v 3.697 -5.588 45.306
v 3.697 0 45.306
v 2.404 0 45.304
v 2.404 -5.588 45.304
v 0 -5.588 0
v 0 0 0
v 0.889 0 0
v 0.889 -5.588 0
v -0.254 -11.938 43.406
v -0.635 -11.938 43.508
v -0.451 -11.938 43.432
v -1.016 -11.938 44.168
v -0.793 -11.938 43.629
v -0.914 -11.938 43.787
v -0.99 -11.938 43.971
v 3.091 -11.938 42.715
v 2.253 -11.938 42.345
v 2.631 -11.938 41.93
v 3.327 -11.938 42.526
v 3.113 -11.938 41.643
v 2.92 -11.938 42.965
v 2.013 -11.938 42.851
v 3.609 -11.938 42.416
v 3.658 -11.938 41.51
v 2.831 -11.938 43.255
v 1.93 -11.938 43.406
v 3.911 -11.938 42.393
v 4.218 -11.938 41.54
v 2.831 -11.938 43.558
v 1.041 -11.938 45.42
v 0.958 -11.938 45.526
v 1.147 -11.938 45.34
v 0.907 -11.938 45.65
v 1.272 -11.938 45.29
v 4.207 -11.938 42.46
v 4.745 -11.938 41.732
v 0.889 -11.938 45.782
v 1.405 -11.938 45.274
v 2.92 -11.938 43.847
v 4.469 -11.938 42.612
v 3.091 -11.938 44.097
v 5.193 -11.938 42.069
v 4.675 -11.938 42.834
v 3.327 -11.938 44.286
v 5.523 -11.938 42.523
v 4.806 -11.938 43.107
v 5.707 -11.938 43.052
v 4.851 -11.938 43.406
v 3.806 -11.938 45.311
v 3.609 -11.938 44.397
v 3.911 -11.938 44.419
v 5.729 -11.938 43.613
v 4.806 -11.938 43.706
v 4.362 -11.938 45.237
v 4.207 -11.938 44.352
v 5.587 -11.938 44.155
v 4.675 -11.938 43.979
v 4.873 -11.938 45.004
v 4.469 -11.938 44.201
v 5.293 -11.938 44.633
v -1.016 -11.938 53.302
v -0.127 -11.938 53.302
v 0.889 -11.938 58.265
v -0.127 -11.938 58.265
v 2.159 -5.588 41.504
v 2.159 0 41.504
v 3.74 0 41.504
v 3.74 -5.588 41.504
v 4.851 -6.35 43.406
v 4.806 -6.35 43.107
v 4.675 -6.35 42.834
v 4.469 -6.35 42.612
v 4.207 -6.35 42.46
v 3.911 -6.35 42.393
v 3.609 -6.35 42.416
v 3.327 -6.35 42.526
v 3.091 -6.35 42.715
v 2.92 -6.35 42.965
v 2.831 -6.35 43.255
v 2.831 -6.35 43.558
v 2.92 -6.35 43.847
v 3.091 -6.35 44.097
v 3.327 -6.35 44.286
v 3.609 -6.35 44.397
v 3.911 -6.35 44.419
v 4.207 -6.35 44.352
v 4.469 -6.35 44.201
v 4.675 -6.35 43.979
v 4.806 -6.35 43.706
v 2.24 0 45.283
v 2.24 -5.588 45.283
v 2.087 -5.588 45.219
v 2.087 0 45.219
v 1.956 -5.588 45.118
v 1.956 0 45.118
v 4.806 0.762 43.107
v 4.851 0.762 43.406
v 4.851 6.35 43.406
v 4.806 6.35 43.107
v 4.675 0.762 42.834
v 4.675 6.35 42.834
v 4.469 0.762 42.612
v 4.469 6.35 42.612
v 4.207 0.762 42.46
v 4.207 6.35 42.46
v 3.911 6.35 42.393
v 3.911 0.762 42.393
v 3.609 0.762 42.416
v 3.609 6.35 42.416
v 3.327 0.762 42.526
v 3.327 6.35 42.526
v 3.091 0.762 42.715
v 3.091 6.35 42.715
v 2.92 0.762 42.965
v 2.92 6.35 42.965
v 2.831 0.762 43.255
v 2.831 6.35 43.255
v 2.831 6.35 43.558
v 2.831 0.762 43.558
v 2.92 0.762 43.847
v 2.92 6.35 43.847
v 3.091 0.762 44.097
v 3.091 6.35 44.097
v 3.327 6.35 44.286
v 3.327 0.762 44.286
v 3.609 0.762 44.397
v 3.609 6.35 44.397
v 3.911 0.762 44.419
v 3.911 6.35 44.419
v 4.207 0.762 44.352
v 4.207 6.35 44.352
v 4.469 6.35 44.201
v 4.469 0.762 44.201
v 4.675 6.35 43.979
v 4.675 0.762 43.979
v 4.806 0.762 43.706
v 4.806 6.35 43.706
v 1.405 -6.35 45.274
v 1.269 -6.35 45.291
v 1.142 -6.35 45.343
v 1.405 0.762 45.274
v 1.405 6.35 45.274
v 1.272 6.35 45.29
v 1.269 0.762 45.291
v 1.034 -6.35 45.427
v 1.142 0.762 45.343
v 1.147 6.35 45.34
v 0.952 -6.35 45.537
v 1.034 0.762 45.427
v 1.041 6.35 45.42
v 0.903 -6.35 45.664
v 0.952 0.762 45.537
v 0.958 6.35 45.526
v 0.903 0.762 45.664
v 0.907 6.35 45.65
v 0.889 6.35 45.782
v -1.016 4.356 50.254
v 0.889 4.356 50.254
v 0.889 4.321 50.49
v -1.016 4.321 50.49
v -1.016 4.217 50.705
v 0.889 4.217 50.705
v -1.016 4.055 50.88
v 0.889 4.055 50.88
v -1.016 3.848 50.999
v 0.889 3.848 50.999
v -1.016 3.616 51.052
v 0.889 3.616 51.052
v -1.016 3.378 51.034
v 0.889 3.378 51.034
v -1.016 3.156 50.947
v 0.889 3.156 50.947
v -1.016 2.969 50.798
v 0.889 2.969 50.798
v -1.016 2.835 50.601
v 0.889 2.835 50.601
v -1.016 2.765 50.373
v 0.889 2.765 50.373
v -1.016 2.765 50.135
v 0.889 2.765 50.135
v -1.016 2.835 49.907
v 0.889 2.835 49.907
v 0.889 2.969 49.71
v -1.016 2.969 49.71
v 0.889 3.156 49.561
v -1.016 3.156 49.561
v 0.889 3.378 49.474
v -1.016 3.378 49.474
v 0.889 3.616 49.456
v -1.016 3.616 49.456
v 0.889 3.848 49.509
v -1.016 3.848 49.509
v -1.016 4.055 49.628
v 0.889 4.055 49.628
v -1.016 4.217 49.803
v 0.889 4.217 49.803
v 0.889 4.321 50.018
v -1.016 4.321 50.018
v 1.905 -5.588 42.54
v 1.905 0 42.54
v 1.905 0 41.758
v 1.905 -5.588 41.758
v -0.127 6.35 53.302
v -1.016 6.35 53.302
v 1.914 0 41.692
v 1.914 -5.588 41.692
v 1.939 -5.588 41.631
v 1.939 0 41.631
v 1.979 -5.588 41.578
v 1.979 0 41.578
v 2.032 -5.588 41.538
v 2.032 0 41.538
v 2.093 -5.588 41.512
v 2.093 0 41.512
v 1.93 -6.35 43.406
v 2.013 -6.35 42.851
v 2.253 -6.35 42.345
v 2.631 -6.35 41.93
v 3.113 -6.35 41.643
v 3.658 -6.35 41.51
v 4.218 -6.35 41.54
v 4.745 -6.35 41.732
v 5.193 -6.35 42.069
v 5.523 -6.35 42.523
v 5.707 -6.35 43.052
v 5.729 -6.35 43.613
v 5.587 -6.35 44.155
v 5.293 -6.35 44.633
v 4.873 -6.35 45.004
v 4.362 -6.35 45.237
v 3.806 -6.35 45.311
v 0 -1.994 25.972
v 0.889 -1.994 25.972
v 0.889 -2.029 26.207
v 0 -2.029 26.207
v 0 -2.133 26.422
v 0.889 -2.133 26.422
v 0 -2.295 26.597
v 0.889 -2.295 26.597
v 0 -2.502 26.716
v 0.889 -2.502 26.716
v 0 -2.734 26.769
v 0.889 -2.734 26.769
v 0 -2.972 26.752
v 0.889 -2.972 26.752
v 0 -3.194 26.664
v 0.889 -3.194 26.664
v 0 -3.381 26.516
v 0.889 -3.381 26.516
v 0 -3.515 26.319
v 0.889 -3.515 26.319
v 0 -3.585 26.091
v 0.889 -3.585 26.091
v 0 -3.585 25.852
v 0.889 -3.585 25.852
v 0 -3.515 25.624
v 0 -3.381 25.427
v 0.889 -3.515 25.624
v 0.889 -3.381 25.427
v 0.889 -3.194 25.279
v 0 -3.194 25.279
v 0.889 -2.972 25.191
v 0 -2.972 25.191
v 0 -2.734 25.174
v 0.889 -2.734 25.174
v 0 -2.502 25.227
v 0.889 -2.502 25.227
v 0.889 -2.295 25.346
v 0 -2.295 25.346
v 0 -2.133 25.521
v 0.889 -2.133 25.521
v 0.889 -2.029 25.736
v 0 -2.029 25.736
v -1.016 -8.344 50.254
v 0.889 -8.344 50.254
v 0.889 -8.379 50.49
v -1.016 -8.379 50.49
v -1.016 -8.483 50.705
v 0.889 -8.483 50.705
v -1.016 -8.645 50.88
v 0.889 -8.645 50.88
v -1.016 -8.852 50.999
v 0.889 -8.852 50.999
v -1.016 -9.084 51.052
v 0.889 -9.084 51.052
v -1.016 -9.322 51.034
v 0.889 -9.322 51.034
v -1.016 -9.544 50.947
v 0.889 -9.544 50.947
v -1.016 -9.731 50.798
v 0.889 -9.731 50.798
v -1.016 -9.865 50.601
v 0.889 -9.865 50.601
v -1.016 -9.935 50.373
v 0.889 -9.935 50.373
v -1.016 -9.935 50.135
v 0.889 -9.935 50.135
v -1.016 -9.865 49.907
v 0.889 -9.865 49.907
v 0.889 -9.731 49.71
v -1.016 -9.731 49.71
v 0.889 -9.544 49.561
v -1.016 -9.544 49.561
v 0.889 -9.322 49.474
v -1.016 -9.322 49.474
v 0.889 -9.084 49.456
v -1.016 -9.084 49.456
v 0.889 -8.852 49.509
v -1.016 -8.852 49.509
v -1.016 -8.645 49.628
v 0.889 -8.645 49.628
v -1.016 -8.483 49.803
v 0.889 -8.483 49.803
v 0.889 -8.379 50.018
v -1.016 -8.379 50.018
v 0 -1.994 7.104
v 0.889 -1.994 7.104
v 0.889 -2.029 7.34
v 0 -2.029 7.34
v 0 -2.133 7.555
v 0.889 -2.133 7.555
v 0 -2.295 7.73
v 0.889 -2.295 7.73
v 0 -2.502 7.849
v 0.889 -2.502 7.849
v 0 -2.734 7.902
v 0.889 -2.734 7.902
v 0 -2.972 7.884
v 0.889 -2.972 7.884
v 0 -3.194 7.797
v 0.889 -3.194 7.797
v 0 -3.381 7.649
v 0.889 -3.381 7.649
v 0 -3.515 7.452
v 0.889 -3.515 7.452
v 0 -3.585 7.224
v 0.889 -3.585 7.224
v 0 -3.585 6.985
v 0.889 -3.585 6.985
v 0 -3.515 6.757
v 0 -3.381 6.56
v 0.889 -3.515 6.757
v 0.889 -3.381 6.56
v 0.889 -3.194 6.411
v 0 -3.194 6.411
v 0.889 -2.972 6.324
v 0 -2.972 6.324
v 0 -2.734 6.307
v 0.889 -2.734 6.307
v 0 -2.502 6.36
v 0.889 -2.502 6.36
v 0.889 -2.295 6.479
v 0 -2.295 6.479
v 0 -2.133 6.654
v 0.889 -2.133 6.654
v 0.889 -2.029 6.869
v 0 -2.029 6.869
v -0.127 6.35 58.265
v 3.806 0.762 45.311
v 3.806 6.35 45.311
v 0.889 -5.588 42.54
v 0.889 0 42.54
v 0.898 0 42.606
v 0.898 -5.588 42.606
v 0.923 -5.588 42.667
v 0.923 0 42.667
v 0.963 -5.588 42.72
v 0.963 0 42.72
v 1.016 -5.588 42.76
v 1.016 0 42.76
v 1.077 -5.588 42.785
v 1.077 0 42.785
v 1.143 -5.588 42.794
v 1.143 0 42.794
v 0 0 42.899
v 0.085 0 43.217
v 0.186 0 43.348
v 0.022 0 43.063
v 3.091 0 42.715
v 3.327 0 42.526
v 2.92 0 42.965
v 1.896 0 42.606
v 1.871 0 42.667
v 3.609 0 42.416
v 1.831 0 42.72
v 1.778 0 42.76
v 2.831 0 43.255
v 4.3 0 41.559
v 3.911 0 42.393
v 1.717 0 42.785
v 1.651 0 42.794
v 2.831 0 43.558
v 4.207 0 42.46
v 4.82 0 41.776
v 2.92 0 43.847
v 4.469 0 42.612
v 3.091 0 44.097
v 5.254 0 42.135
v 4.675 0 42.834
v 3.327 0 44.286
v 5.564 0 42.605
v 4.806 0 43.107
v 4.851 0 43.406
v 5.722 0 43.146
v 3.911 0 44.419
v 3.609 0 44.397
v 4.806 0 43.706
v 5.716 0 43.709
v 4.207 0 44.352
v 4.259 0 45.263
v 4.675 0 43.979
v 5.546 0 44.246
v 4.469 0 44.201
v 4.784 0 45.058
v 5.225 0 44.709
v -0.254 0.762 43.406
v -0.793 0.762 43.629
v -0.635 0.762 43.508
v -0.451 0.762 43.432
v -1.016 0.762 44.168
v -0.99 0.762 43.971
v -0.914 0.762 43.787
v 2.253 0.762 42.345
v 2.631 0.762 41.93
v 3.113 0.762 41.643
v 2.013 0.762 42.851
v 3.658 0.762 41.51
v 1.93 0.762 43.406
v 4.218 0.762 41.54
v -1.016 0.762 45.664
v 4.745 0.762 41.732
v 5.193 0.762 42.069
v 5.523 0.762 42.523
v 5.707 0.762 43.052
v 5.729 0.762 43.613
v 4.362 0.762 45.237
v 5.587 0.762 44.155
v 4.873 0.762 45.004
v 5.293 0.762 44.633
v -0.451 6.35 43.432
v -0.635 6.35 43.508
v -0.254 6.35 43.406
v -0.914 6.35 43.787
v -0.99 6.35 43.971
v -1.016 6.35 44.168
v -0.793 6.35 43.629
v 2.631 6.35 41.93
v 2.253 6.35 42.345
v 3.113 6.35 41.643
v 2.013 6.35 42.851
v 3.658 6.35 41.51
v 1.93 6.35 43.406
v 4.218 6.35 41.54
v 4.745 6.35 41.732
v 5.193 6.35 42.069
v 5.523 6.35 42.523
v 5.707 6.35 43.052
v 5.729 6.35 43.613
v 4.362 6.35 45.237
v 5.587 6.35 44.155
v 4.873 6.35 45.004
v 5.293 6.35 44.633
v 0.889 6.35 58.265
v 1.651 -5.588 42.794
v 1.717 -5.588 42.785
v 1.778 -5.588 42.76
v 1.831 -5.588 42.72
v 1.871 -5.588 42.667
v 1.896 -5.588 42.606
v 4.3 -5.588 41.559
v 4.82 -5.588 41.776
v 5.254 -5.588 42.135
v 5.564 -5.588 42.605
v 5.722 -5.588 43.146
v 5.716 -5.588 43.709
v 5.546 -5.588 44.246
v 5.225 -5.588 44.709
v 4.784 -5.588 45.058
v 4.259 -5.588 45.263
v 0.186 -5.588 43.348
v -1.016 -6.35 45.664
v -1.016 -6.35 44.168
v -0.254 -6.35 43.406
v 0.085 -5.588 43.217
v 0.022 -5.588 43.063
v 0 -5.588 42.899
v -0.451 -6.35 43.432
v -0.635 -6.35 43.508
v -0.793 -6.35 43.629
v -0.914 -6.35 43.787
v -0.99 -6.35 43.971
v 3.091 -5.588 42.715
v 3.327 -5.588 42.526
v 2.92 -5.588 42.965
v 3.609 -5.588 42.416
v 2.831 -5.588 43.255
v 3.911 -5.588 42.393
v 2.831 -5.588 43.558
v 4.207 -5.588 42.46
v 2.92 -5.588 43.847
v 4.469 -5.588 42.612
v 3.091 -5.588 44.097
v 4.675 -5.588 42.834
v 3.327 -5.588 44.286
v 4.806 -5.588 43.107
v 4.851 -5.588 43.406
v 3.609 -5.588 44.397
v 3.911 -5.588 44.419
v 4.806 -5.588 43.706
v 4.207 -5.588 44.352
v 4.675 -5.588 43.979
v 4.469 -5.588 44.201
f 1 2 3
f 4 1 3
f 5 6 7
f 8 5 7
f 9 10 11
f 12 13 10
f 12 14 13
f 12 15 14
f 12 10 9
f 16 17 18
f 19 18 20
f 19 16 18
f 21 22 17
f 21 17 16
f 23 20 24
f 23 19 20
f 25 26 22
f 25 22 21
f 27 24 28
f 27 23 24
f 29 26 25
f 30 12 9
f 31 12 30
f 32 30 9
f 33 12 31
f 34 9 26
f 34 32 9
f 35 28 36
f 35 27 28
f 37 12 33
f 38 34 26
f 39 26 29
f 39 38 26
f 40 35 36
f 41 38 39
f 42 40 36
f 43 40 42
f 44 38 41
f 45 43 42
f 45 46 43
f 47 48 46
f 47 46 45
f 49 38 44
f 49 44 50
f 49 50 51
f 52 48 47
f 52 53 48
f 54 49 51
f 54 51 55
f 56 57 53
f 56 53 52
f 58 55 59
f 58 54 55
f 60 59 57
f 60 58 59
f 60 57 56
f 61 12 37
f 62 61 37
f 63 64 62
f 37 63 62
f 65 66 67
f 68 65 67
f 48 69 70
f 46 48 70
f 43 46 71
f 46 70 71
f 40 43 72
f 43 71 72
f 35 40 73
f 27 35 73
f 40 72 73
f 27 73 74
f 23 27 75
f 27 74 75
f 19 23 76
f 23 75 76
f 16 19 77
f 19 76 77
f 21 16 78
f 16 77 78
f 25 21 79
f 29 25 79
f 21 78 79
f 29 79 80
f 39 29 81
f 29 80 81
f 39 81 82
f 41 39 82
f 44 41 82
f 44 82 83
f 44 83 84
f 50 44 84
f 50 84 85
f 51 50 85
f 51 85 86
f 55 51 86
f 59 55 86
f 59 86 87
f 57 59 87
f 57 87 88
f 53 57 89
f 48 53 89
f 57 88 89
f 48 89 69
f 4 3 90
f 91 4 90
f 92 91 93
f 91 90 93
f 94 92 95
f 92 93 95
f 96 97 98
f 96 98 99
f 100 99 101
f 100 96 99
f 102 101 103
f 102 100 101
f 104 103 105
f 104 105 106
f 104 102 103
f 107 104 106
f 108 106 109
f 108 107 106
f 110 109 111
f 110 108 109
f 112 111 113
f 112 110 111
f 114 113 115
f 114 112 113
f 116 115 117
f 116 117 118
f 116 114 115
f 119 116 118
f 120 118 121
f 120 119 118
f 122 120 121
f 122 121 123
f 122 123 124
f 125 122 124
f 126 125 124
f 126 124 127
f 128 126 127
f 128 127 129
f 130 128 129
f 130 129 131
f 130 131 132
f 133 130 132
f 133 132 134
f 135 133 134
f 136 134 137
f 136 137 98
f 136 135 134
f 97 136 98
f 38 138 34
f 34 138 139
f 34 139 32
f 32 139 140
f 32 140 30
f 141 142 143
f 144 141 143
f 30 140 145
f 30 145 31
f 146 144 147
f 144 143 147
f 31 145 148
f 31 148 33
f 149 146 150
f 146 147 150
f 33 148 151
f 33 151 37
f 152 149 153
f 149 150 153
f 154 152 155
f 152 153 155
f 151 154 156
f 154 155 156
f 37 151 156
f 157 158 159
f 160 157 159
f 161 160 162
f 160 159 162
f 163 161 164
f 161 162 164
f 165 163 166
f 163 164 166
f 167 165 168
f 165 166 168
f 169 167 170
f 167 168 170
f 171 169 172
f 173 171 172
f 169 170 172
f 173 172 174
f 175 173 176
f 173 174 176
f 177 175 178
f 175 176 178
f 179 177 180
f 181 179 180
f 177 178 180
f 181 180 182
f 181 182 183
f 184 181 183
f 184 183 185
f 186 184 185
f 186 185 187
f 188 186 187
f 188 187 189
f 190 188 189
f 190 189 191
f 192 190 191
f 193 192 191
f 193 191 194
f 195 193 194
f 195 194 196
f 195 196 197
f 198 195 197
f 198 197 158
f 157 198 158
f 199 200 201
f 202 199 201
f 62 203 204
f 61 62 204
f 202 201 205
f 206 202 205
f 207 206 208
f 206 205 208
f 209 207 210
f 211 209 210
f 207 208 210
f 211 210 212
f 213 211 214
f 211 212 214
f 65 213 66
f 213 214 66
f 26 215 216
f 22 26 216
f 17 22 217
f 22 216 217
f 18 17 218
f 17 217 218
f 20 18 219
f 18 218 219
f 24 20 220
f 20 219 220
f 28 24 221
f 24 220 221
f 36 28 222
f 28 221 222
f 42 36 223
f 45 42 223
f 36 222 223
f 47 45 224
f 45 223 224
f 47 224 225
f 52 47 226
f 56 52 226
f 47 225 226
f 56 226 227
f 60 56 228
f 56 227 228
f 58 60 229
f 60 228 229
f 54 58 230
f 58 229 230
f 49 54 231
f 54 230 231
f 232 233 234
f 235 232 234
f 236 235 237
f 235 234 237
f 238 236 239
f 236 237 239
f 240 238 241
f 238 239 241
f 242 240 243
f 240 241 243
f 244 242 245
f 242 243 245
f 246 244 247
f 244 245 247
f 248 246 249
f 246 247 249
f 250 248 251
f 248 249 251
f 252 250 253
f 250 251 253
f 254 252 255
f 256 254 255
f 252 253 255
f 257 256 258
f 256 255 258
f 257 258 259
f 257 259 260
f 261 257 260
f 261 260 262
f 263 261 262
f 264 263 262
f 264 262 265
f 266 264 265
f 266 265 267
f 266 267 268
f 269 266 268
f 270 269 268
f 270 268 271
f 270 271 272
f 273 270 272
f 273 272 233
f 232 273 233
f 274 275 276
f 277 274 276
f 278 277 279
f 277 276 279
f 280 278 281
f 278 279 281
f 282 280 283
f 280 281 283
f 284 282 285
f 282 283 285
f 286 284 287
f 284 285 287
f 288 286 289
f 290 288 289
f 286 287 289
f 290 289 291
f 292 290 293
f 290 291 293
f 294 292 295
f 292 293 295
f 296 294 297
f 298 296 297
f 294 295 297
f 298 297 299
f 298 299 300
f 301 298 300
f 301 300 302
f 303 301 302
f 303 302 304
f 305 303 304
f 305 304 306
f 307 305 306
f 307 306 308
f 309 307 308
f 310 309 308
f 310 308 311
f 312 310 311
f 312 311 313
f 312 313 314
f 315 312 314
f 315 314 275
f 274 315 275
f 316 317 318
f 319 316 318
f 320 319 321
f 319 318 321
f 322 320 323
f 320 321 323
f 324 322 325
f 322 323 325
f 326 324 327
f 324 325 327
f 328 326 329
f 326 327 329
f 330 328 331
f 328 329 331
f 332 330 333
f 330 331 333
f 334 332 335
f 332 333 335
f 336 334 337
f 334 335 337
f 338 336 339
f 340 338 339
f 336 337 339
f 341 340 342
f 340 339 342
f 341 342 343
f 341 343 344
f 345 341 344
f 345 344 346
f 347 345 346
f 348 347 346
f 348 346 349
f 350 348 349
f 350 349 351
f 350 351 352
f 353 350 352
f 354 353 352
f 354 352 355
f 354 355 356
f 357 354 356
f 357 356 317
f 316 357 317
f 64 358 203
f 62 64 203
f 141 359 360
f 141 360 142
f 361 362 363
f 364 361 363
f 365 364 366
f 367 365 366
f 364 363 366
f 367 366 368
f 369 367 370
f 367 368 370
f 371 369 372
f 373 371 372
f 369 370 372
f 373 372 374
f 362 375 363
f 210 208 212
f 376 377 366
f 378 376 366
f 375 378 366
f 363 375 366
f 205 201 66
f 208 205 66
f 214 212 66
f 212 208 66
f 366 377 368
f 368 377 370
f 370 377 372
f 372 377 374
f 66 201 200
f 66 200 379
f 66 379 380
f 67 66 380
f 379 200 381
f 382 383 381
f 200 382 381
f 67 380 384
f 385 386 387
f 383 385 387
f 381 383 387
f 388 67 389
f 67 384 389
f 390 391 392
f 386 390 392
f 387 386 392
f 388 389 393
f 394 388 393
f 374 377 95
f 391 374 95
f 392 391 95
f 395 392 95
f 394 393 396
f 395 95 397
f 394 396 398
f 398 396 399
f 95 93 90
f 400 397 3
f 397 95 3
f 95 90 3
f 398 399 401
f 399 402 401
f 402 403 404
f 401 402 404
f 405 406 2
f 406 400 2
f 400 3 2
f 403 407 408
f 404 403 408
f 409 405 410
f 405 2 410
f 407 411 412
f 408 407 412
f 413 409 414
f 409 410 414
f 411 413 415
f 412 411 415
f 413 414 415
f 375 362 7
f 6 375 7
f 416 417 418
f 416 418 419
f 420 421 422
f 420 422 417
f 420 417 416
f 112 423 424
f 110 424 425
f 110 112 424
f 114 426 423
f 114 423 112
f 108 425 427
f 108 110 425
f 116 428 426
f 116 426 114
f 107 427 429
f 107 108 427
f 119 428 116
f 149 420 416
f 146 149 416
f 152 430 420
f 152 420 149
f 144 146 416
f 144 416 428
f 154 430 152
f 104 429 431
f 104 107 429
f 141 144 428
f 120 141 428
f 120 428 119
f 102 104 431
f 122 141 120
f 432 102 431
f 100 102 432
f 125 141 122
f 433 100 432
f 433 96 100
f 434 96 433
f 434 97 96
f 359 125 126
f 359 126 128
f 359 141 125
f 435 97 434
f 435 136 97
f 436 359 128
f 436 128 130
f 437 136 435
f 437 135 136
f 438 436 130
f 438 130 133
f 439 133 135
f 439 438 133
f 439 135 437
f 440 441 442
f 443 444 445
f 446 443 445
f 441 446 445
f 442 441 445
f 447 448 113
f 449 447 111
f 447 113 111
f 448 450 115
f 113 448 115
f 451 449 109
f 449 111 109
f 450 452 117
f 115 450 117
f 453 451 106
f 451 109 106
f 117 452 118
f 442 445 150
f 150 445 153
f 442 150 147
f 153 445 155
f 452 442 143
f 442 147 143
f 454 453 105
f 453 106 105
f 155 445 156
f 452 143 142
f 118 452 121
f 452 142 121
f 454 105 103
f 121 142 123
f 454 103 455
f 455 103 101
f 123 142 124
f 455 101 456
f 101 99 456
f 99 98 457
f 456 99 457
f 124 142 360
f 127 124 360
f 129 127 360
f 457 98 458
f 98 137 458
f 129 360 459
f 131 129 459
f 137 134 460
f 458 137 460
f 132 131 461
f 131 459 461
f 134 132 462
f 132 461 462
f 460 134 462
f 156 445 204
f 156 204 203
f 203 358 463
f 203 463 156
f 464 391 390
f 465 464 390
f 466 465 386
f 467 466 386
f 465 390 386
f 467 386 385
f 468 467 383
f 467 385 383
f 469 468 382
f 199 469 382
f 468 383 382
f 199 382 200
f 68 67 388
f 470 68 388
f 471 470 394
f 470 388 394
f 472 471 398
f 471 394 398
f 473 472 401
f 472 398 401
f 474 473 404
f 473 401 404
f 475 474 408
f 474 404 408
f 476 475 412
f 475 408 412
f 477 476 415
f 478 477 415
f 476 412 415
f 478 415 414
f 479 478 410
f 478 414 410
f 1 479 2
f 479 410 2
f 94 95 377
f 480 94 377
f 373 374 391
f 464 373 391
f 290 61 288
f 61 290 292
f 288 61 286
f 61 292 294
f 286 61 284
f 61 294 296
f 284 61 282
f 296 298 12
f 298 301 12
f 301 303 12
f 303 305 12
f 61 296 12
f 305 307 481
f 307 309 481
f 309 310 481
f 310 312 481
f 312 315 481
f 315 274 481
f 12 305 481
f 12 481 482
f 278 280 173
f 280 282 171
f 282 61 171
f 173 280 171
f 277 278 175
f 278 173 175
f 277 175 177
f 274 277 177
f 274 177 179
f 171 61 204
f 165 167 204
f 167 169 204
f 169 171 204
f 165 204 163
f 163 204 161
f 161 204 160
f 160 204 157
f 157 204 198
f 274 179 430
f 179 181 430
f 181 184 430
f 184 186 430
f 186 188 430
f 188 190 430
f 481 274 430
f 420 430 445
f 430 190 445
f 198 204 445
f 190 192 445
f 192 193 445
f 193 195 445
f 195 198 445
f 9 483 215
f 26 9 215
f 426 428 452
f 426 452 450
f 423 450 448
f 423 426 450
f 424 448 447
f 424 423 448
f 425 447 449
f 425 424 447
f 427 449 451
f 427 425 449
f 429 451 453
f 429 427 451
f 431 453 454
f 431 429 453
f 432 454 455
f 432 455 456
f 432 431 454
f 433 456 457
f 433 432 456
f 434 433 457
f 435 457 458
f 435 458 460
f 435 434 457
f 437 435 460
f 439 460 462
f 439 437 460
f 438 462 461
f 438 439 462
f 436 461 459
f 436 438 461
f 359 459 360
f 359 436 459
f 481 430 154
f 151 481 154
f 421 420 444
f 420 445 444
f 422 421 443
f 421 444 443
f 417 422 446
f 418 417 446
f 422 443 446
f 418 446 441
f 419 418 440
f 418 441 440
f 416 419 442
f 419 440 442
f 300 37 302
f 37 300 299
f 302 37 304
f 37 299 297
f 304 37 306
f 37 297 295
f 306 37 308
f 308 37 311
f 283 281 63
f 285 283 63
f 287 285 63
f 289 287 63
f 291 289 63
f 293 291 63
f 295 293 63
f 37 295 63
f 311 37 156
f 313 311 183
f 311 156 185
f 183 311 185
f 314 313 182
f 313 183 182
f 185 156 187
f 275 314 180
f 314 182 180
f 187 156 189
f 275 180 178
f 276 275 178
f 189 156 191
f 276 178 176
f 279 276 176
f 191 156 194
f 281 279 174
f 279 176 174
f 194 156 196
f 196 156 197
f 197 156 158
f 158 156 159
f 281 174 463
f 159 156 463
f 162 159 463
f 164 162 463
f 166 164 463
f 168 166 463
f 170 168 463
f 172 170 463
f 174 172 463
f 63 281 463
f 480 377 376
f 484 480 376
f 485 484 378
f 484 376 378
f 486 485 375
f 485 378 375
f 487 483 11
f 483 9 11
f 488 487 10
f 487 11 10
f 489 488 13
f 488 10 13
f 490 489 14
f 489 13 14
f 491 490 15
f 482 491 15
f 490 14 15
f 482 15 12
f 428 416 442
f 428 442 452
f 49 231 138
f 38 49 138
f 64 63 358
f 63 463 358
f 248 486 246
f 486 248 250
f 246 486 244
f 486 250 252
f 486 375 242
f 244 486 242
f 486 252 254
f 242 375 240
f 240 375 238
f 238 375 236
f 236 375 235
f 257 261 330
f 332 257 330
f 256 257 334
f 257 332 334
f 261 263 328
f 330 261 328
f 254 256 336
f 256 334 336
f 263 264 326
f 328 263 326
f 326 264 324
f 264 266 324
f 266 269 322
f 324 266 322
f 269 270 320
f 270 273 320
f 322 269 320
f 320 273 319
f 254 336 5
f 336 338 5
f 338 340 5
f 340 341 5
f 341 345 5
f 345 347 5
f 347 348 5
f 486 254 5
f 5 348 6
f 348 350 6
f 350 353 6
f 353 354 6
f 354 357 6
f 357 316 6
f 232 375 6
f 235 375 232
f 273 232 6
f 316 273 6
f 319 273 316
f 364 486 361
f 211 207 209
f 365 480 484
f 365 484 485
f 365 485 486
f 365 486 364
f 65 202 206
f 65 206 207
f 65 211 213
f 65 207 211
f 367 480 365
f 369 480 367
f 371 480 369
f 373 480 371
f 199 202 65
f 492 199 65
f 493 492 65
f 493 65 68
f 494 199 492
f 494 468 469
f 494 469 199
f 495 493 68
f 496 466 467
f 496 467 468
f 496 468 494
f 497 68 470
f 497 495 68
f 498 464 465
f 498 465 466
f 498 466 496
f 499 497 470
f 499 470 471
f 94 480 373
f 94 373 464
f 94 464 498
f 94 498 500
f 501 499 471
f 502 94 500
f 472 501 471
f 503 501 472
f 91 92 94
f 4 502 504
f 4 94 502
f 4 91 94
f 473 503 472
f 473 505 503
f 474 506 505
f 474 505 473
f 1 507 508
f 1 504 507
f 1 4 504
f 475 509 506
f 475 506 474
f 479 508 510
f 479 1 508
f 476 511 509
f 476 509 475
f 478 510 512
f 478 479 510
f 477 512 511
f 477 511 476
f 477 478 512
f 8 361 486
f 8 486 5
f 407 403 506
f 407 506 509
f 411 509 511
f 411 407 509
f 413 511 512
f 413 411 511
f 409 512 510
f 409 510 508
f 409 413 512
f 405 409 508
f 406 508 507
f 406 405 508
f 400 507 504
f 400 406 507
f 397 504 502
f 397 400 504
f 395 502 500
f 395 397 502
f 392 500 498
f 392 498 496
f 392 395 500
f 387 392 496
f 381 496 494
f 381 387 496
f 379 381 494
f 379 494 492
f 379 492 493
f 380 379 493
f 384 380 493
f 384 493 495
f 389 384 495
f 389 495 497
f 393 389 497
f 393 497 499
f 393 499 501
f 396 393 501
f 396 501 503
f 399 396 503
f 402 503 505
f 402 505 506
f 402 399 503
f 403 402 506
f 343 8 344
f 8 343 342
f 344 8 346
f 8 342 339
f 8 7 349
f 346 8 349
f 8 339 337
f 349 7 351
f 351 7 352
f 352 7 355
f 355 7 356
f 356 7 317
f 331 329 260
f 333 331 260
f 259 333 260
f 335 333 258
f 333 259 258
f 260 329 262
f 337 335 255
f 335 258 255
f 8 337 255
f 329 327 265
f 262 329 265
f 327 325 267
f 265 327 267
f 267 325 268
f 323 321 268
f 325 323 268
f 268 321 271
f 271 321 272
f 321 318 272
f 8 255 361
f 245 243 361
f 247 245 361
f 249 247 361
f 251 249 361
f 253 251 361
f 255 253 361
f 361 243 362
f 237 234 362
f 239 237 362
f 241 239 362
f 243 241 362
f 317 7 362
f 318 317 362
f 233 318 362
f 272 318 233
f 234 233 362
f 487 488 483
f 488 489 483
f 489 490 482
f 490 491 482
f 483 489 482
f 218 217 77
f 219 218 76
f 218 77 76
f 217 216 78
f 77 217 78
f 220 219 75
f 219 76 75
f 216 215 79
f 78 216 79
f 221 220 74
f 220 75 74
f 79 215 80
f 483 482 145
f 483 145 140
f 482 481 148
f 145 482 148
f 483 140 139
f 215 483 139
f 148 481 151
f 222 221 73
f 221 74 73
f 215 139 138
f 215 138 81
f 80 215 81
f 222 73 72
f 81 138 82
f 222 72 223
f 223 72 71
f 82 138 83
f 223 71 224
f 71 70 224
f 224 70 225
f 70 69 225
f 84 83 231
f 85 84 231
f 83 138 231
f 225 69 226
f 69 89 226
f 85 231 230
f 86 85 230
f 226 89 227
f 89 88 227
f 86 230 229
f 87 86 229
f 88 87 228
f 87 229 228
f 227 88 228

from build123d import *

# Parameters (mm, degrees)
F0_R           = 1.016
F1_DEPTH       = 5.588
F2_R           = 0.8001
F3_DEPTH       = 25.4
F3_DEPTH_BACK  = 25.4
F6_DEPTH       = 5.588
F10_DEPTH      = 7.112
F12_R          = 0.508
F13_R          = 0.762
F14_R          = 0.8001
F15_DEPTH      = 25.4
F15_DEPTH_BACK = 25.4
F16_DEPTH      = 25.4
F16_DEPTH_BACK = 25.4


with BuildPart() as f1:
    # F0 (on Front) → F1 (new body)
    with BuildSketch(Plane.XZ):
        with BuildLine():
            Line((0, 42.8991302448), (0, 0))
            Line((0, 0), (0.889, 0))
            Line((0.889, 0), (0.889, 42.53992))
            ThreePointArc((0.889, 42.53992), (0.9633948776, 42.7195251224), (1.143, 42.79392))
            Line((1.143, 42.79392), (1.651, 42.79392))
            ThreePointArc((1.651, 42.79392), (1.8306051224, 42.7195251224), (1.905, 42.53992))
            Line((1.905, 42.53992), (1.905, 41.7576))
            ThreePointArc((1.905, 41.7576), (1.9793948776, 41.5779948776), (2.159, 41.5036))
            Line((2.159, 41.5036), (3.7398205742, 41.5036))
            ThreePointArc((3.7398205742, 41.5036), (5.7402818064, 43.4274211016), (3.6974596514, 45.306200071))
            Line((3.6974596514, 45.306200071), (2.4042806048, 45.3043289671))
            ThreePointArc((2.4042806048, 45.3043289671), (2.1617710488, 45.25581718), (1.9561865808, 45.1183424378))
            Line((1.9561865808, 45.1183424378), (0.1859871939, 43.3481430509))
            ThreePointArc((0.1859871939, 43.3481430509), (0.0483364969, 43.1421342244), (0, 42.8991302448))
        make_face()
        with Locations((3.8354, 43.4062007393)):
            Circle(F0_R, mode=Mode.SUBTRACT)
    extrude(amount=F1_DEPTH)

    # F2 (on face) → F3 (cut, two sides)
    with BuildSketch(Plane.YZ.offset(0.889)) as f3_sk:
        with Locations((-2.794, 25.9715)):
            Circle(F2_R)
        with Locations((-2.794, 7.10438)):
            Circle(F2_R)
    extrude(amount=-F3_DEPTH, mode=Mode.SUBTRACT)
    extrude(f3_sk.sketch, amount=F3_DEPTH_BACK, mode=Mode.SUBTRACT)


with BuildPart() as f6:
    # F5 (on offset) → F6 (new body)
    with BuildSketch(Plane.XZ.offset(-0.762)):
        with BuildLine():
            Line((-1.016, 43.4062007393), (1.9304, 43.4062007393))
            ThreePointArc((1.9304, 43.4062007393), (5.1926627539, 42.0694648578), (3.8063714614, 45.3109795569))
            Line((3.8063714614, 45.3109795569), (0.889, 45.2665192609))
            Line((0.889, 45.2665192609), (0.889, 58.2652007393))
            Line((0.889, 58.2652007393), (-0.127, 58.2652007393))
            Line((-0.127, 58.2652007393), (-0.127, 53.3020407393))
            Line((-0.127, 53.3020407393), (-1.016, 53.3020407393))
            Line((-1.016, 53.3020407393), (-1.016, 43.4062007393))
        make_face()
        with BuildLine():
            ThreePointArc((2.8194, 43.4062007393), (3.8354, 44.4222007393), (4.8514, 43.4062007393))
            ThreePointArc((4.8514, 43.4062007393), (3.8354, 42.3902007393), (2.8194, 43.4062007393))
        make_face(mode=Mode.SUBTRACT)
    extrude(amount=-F6_DEPTH)


with BuildPart() as f8_1:
    # F8: instance of F6
    add(f6.part.mirror(Plane.XZ.offset(2.794)))


with BuildPart() as f10:
    # F9 (on face) → F10 (new body, through all)
    with BuildSketch(Plane.XZ.offset(-0.762)):
        Polygon((-1.016, 53.3020407393), (-1.016, 45.6642607393), (0.889, 45.6642607393), (0.889, 58.2652007393), (-0.127, 58.2652007393), (-0.127, 53.3020407393), align=None)
    extrude(amount=F10_DEPTH)


with BuildPart() as f6_1:
    add(f6.part)

    # F11: union F10, F8_1
    add(f10.part)
    add(f8_1.part)

    # F12
    f12_edges = [f6_1.edges().sort_by_distance(p)[0] for p in [
        (0.889, 3.556, 45.266519),
    ]]
    fillet(f12_edges, radius=F12_R)

    # F13
    f13_edges = [f6_1.edges().sort_by_distance(p)[0] for p in [
        (-1.016, -9.144, 43.406201),
        (-1.016, 3.556, 43.406201),
    ]]
    fillet(f13_edges, radius=F13_R)

    # F14 (on face) → F15 (cut, two sides)
    with BuildSketch(Plane.YZ.offset(0.889)) as f15_sk:
        with Locations((-9.144, 50.2540407393)):
            Circle(F14_R)
    extrude(amount=-F15_DEPTH, mode=Mode.SUBTRACT)
    extrude(f15_sk.sketch, amount=F15_DEPTH_BACK, mode=Mode.SUBTRACT)

    # F14 (on face) → F16 (cut, two sides)
    with BuildSketch(Plane.YZ.offset(0.889)) as f16_sk:
        with Locations((-9.144, 50.2540407393)):
            Circle(F14_R)
        with Locations((3.556, 50.2540407393)):
            Circle(F14_R)
    extrude(amount=-F16_DEPTH, mode=Mode.SUBTRACT)
    extrude(f16_sk.sketch, amount=F16_DEPTH_BACK, mode=Mode.SUBTRACT)


solid = Compound([f1.part, f6_1.part])
